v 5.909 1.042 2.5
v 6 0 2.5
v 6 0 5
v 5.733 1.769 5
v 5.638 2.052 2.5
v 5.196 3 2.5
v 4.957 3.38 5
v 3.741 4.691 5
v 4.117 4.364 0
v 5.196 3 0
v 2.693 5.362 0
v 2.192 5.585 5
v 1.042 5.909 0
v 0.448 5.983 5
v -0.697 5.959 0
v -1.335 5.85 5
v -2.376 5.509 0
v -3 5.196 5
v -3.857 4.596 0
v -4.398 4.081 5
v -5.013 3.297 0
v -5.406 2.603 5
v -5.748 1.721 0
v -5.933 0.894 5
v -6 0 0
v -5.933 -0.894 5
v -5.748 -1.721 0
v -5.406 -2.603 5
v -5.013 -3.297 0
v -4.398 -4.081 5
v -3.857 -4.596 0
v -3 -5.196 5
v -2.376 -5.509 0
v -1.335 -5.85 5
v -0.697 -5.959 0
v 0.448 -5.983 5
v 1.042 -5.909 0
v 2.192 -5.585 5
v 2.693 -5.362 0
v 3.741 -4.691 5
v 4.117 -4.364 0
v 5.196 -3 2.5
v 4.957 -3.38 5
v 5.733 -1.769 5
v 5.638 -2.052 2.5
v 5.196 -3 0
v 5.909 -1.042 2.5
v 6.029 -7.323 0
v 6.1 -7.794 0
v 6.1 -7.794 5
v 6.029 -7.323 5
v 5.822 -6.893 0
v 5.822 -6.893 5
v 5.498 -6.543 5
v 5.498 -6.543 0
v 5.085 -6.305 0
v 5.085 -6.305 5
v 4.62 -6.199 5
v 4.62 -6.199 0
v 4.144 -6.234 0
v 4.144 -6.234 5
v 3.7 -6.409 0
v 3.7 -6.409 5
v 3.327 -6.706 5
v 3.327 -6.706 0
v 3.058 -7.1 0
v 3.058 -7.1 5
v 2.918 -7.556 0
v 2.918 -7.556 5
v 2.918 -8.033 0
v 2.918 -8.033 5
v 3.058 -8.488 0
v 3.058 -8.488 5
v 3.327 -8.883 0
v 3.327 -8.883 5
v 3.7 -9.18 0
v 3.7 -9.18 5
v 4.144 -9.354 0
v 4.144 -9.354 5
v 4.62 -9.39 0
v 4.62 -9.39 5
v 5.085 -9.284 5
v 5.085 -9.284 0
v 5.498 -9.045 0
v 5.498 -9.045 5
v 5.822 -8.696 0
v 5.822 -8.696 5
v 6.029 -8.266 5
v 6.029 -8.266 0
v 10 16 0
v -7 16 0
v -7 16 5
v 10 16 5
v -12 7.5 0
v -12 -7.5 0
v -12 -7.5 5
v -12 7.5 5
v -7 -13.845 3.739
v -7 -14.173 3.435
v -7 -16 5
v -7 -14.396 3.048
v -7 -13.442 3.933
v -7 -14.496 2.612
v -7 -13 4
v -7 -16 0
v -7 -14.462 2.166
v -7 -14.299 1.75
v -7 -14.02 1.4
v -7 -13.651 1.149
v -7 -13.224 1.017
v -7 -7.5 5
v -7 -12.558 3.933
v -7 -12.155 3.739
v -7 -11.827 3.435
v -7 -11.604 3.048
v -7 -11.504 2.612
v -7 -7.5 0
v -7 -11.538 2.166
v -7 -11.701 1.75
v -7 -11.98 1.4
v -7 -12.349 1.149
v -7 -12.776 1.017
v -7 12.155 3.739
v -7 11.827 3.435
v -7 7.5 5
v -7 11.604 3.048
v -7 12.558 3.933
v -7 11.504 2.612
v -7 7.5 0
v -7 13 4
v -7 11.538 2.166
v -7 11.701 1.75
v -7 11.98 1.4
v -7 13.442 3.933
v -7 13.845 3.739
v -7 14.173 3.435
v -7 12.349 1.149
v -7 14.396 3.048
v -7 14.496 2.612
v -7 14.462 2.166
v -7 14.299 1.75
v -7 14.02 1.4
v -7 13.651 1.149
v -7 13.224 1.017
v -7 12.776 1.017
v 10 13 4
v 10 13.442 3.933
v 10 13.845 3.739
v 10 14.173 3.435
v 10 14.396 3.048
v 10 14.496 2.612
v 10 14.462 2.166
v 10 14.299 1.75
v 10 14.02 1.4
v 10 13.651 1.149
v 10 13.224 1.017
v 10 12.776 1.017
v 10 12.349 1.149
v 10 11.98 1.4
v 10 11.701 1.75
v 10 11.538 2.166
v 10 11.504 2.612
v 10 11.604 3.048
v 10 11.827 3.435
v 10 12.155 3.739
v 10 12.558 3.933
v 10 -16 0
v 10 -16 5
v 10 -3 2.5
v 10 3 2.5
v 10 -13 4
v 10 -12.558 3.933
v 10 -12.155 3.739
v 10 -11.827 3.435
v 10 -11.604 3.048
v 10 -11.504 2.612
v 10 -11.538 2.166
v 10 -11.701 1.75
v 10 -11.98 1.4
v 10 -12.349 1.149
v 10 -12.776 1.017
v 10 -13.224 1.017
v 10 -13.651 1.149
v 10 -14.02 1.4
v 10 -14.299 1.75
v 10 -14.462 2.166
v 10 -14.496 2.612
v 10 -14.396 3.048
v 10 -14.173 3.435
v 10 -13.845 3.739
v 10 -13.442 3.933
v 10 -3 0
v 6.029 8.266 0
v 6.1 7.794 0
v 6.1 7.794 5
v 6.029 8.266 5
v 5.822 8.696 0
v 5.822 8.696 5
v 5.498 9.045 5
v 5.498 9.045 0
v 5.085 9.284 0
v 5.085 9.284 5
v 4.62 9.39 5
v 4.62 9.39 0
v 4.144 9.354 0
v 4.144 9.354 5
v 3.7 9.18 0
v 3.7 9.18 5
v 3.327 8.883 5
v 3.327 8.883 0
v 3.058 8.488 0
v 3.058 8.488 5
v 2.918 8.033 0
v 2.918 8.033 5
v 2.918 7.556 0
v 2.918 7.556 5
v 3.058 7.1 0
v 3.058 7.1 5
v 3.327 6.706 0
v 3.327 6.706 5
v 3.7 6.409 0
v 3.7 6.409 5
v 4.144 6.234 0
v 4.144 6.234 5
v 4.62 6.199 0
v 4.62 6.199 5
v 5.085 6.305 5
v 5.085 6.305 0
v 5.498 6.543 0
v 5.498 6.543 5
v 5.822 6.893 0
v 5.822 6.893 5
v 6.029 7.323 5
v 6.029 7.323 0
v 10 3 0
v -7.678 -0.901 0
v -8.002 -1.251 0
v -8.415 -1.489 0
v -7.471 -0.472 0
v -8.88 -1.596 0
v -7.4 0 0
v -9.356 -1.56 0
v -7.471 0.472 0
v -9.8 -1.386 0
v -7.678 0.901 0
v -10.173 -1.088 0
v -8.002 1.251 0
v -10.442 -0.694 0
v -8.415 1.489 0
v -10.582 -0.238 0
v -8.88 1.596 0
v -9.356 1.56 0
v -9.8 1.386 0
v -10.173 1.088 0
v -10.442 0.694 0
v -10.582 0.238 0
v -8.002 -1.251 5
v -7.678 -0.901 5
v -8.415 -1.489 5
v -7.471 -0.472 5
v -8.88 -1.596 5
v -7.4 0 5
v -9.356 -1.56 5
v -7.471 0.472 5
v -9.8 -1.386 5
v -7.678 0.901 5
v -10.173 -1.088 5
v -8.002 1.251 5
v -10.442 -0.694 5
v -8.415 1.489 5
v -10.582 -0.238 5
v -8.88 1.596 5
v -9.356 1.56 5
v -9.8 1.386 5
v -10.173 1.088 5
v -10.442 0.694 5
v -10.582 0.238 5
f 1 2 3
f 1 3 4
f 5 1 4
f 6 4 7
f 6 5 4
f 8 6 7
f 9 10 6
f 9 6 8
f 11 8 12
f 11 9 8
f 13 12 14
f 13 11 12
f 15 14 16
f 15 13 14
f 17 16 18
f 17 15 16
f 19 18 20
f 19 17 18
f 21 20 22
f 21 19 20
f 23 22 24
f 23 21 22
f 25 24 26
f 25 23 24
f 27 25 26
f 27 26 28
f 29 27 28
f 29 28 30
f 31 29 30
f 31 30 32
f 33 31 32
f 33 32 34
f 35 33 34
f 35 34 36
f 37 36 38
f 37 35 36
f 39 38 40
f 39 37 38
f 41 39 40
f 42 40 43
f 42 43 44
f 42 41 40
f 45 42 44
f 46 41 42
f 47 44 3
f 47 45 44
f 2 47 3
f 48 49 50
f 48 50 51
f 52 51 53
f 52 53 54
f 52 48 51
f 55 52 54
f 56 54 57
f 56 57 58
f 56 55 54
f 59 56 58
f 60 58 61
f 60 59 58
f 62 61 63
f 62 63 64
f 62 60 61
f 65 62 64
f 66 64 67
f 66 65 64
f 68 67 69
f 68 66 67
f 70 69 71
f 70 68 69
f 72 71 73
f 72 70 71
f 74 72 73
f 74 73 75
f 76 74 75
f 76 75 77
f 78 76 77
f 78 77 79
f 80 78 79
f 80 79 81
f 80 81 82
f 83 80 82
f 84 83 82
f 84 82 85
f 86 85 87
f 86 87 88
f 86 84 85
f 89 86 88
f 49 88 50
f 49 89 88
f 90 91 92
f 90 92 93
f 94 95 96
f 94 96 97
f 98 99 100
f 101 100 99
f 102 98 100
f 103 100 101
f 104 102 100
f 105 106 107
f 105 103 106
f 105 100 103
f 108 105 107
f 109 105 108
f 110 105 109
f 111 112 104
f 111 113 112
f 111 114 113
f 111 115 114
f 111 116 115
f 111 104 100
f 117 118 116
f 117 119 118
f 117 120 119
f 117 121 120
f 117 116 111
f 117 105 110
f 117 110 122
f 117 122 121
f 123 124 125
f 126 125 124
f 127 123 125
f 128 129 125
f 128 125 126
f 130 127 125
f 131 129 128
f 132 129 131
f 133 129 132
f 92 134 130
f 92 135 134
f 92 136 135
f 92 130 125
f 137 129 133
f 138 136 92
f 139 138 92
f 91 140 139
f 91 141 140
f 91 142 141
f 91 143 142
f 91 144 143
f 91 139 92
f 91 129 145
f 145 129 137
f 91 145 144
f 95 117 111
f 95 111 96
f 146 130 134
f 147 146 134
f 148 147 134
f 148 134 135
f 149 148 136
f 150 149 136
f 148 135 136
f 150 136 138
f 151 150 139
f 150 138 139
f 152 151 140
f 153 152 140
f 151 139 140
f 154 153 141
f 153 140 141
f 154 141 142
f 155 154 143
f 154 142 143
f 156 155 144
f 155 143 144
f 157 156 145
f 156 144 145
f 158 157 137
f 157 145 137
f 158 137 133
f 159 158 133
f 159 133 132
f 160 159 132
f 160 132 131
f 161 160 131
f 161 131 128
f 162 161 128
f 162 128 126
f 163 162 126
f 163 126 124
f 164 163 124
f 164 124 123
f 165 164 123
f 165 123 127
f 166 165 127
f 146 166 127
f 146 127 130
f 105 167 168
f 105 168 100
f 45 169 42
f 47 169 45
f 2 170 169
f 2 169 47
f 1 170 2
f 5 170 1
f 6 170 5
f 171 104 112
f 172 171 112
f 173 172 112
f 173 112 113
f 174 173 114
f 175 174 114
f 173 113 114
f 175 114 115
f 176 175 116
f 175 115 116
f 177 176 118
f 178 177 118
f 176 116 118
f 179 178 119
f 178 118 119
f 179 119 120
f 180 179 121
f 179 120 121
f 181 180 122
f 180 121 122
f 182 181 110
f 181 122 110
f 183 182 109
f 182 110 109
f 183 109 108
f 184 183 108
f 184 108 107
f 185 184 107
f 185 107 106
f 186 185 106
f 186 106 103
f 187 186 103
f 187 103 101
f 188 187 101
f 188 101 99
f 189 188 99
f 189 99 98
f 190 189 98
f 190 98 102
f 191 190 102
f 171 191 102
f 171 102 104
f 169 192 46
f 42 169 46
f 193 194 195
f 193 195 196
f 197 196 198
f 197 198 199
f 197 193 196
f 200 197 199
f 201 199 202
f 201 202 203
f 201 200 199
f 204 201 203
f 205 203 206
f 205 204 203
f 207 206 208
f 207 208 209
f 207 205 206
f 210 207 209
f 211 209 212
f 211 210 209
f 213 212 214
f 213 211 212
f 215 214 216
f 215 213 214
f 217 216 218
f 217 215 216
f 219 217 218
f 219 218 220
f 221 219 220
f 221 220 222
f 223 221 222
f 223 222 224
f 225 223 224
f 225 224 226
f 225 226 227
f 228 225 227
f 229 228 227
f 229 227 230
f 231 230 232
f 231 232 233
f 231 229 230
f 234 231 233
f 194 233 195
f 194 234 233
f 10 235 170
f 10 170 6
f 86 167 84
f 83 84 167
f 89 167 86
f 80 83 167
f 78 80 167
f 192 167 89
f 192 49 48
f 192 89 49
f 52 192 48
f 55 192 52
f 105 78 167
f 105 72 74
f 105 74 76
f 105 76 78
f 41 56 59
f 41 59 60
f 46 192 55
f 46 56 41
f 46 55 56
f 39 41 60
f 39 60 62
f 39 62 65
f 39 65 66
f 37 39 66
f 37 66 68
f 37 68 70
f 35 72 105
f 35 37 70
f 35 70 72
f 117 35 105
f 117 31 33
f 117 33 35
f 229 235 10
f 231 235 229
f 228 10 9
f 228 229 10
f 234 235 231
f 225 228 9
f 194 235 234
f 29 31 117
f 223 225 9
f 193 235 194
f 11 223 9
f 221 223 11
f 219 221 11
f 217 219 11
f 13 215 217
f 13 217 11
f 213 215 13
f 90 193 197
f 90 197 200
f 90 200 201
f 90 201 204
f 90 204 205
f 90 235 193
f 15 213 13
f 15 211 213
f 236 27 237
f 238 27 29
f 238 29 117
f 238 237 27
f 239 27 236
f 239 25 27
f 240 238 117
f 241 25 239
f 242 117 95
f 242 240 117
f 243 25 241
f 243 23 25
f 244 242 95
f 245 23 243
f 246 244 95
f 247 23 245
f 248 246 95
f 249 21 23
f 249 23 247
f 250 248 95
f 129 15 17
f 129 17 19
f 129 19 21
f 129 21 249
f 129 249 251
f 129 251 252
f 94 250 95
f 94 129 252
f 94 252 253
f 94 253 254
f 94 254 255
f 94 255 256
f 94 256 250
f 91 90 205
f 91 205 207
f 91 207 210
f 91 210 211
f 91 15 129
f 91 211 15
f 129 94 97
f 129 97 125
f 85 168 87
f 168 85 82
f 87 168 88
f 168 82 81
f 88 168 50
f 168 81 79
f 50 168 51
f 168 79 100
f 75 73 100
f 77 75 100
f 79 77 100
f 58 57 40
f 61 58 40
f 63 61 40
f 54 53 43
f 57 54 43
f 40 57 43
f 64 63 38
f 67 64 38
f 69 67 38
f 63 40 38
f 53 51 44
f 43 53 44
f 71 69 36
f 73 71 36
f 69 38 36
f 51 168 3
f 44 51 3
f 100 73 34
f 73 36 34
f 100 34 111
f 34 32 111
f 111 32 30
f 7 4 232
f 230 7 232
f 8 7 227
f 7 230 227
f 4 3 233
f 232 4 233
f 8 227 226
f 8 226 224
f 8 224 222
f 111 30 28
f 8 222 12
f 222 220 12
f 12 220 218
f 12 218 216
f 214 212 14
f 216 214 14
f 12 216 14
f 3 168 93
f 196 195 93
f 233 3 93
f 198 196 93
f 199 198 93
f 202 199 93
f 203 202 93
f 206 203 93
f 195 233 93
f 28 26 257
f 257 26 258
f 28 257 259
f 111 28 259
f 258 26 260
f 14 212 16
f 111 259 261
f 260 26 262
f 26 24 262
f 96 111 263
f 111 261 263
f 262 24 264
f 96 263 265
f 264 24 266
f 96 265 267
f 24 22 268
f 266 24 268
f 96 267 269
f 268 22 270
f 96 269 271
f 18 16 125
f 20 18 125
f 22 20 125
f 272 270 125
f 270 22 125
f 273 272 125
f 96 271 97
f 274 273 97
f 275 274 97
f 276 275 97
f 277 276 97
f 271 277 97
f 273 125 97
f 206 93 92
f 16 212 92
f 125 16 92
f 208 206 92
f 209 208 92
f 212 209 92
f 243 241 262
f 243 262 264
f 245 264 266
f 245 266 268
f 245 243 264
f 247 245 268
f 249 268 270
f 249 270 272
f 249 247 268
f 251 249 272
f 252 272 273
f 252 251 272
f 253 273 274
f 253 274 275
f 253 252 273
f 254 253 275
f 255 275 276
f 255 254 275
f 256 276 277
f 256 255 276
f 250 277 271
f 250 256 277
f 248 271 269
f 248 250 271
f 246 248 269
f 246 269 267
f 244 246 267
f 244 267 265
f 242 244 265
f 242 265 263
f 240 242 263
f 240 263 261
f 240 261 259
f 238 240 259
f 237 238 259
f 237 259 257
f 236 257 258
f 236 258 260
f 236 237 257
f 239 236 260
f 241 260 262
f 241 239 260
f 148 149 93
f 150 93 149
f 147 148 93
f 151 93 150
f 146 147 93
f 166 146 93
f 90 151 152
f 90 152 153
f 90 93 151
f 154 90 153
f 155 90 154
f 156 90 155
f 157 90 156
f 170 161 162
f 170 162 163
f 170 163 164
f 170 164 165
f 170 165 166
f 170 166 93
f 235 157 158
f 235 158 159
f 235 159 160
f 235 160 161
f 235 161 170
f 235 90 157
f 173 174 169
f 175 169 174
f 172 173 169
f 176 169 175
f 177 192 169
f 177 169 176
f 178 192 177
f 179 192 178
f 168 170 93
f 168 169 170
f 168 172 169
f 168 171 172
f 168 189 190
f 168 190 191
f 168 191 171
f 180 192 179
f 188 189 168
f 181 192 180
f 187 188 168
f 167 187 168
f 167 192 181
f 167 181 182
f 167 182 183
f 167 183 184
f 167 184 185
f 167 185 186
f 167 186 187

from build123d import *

# Parameters (mm, degrees)
ESQUISSE1_R             = 6
ESQUISSE1_R_2           = 1.6
EXTRUSION1_DEPTH        = 5
ESQUISSE2_W             = 10
ESQUISSE2_H             = 6
ENL_V_MAT_EXTRU_1_DEPTH = 2.5
ESQUISSE3_R             = 1.5
ENL_V_MAT_EXTRU_2_DEPTH = 28.658633372


with BuildPart() as part:
    # Esquisse1 → Extrusion1 (new body)
    with BuildSketch(Plane.XY):
        Polygon((-7, 16), (10, 16), (10, -16), (-7, -16), (-7, -7.5), (-12, -7.5), (-12, 7.5), (-7, 7.5), align=None)
        Circle(ESQUISSE1_R, mode=Mode.SUBTRACT)
        with Locations((-9, 0)):
            Circle(ESQUISSE1_R_2, mode=Mode.SUBTRACT)
        with Locations((4.5, 7.794228634)):
            Circle(ESQUISSE1_R_2, mode=Mode.SUBTRACT)
        with Locations((4.5, -7.794228634)):
            Circle(ESQUISSE1_R_2, mode=Mode.SUBTRACT)
    extrude(amount=EXTRUSION1_DEPTH)

    # Esquisse2 → Enlèv. mat.-Extru.1 (cut)
    with BuildSketch(Plane(origin=(0, 0, 0), x_dir=(-1, 0, 0), z_dir=(0, 0, -1))):
        with Locations((-5, 0)):
            Rectangle(ESQUISSE2_W, ESQUISSE2_H)
    extrude(amount=-ENL_V_MAT_EXTRU_1_DEPTH, mode=Mode.SUBTRACT)

    # Esquisse3 → Enlèv. mat.-Extru.2 (cut, through all)
    with BuildSketch(Plane.ZY.offset(12)):
        with Locations((2.5, 13)):
            Circle(ESQUISSE3_R)
        with Locations((2.5, -13)):
            Circle(ESQUISSE3_R)
    extrude(amount=-ENL_V_MAT_EXTRU_2_DEPTH, mode=Mode.SUBTRACT)


solid = part.part
